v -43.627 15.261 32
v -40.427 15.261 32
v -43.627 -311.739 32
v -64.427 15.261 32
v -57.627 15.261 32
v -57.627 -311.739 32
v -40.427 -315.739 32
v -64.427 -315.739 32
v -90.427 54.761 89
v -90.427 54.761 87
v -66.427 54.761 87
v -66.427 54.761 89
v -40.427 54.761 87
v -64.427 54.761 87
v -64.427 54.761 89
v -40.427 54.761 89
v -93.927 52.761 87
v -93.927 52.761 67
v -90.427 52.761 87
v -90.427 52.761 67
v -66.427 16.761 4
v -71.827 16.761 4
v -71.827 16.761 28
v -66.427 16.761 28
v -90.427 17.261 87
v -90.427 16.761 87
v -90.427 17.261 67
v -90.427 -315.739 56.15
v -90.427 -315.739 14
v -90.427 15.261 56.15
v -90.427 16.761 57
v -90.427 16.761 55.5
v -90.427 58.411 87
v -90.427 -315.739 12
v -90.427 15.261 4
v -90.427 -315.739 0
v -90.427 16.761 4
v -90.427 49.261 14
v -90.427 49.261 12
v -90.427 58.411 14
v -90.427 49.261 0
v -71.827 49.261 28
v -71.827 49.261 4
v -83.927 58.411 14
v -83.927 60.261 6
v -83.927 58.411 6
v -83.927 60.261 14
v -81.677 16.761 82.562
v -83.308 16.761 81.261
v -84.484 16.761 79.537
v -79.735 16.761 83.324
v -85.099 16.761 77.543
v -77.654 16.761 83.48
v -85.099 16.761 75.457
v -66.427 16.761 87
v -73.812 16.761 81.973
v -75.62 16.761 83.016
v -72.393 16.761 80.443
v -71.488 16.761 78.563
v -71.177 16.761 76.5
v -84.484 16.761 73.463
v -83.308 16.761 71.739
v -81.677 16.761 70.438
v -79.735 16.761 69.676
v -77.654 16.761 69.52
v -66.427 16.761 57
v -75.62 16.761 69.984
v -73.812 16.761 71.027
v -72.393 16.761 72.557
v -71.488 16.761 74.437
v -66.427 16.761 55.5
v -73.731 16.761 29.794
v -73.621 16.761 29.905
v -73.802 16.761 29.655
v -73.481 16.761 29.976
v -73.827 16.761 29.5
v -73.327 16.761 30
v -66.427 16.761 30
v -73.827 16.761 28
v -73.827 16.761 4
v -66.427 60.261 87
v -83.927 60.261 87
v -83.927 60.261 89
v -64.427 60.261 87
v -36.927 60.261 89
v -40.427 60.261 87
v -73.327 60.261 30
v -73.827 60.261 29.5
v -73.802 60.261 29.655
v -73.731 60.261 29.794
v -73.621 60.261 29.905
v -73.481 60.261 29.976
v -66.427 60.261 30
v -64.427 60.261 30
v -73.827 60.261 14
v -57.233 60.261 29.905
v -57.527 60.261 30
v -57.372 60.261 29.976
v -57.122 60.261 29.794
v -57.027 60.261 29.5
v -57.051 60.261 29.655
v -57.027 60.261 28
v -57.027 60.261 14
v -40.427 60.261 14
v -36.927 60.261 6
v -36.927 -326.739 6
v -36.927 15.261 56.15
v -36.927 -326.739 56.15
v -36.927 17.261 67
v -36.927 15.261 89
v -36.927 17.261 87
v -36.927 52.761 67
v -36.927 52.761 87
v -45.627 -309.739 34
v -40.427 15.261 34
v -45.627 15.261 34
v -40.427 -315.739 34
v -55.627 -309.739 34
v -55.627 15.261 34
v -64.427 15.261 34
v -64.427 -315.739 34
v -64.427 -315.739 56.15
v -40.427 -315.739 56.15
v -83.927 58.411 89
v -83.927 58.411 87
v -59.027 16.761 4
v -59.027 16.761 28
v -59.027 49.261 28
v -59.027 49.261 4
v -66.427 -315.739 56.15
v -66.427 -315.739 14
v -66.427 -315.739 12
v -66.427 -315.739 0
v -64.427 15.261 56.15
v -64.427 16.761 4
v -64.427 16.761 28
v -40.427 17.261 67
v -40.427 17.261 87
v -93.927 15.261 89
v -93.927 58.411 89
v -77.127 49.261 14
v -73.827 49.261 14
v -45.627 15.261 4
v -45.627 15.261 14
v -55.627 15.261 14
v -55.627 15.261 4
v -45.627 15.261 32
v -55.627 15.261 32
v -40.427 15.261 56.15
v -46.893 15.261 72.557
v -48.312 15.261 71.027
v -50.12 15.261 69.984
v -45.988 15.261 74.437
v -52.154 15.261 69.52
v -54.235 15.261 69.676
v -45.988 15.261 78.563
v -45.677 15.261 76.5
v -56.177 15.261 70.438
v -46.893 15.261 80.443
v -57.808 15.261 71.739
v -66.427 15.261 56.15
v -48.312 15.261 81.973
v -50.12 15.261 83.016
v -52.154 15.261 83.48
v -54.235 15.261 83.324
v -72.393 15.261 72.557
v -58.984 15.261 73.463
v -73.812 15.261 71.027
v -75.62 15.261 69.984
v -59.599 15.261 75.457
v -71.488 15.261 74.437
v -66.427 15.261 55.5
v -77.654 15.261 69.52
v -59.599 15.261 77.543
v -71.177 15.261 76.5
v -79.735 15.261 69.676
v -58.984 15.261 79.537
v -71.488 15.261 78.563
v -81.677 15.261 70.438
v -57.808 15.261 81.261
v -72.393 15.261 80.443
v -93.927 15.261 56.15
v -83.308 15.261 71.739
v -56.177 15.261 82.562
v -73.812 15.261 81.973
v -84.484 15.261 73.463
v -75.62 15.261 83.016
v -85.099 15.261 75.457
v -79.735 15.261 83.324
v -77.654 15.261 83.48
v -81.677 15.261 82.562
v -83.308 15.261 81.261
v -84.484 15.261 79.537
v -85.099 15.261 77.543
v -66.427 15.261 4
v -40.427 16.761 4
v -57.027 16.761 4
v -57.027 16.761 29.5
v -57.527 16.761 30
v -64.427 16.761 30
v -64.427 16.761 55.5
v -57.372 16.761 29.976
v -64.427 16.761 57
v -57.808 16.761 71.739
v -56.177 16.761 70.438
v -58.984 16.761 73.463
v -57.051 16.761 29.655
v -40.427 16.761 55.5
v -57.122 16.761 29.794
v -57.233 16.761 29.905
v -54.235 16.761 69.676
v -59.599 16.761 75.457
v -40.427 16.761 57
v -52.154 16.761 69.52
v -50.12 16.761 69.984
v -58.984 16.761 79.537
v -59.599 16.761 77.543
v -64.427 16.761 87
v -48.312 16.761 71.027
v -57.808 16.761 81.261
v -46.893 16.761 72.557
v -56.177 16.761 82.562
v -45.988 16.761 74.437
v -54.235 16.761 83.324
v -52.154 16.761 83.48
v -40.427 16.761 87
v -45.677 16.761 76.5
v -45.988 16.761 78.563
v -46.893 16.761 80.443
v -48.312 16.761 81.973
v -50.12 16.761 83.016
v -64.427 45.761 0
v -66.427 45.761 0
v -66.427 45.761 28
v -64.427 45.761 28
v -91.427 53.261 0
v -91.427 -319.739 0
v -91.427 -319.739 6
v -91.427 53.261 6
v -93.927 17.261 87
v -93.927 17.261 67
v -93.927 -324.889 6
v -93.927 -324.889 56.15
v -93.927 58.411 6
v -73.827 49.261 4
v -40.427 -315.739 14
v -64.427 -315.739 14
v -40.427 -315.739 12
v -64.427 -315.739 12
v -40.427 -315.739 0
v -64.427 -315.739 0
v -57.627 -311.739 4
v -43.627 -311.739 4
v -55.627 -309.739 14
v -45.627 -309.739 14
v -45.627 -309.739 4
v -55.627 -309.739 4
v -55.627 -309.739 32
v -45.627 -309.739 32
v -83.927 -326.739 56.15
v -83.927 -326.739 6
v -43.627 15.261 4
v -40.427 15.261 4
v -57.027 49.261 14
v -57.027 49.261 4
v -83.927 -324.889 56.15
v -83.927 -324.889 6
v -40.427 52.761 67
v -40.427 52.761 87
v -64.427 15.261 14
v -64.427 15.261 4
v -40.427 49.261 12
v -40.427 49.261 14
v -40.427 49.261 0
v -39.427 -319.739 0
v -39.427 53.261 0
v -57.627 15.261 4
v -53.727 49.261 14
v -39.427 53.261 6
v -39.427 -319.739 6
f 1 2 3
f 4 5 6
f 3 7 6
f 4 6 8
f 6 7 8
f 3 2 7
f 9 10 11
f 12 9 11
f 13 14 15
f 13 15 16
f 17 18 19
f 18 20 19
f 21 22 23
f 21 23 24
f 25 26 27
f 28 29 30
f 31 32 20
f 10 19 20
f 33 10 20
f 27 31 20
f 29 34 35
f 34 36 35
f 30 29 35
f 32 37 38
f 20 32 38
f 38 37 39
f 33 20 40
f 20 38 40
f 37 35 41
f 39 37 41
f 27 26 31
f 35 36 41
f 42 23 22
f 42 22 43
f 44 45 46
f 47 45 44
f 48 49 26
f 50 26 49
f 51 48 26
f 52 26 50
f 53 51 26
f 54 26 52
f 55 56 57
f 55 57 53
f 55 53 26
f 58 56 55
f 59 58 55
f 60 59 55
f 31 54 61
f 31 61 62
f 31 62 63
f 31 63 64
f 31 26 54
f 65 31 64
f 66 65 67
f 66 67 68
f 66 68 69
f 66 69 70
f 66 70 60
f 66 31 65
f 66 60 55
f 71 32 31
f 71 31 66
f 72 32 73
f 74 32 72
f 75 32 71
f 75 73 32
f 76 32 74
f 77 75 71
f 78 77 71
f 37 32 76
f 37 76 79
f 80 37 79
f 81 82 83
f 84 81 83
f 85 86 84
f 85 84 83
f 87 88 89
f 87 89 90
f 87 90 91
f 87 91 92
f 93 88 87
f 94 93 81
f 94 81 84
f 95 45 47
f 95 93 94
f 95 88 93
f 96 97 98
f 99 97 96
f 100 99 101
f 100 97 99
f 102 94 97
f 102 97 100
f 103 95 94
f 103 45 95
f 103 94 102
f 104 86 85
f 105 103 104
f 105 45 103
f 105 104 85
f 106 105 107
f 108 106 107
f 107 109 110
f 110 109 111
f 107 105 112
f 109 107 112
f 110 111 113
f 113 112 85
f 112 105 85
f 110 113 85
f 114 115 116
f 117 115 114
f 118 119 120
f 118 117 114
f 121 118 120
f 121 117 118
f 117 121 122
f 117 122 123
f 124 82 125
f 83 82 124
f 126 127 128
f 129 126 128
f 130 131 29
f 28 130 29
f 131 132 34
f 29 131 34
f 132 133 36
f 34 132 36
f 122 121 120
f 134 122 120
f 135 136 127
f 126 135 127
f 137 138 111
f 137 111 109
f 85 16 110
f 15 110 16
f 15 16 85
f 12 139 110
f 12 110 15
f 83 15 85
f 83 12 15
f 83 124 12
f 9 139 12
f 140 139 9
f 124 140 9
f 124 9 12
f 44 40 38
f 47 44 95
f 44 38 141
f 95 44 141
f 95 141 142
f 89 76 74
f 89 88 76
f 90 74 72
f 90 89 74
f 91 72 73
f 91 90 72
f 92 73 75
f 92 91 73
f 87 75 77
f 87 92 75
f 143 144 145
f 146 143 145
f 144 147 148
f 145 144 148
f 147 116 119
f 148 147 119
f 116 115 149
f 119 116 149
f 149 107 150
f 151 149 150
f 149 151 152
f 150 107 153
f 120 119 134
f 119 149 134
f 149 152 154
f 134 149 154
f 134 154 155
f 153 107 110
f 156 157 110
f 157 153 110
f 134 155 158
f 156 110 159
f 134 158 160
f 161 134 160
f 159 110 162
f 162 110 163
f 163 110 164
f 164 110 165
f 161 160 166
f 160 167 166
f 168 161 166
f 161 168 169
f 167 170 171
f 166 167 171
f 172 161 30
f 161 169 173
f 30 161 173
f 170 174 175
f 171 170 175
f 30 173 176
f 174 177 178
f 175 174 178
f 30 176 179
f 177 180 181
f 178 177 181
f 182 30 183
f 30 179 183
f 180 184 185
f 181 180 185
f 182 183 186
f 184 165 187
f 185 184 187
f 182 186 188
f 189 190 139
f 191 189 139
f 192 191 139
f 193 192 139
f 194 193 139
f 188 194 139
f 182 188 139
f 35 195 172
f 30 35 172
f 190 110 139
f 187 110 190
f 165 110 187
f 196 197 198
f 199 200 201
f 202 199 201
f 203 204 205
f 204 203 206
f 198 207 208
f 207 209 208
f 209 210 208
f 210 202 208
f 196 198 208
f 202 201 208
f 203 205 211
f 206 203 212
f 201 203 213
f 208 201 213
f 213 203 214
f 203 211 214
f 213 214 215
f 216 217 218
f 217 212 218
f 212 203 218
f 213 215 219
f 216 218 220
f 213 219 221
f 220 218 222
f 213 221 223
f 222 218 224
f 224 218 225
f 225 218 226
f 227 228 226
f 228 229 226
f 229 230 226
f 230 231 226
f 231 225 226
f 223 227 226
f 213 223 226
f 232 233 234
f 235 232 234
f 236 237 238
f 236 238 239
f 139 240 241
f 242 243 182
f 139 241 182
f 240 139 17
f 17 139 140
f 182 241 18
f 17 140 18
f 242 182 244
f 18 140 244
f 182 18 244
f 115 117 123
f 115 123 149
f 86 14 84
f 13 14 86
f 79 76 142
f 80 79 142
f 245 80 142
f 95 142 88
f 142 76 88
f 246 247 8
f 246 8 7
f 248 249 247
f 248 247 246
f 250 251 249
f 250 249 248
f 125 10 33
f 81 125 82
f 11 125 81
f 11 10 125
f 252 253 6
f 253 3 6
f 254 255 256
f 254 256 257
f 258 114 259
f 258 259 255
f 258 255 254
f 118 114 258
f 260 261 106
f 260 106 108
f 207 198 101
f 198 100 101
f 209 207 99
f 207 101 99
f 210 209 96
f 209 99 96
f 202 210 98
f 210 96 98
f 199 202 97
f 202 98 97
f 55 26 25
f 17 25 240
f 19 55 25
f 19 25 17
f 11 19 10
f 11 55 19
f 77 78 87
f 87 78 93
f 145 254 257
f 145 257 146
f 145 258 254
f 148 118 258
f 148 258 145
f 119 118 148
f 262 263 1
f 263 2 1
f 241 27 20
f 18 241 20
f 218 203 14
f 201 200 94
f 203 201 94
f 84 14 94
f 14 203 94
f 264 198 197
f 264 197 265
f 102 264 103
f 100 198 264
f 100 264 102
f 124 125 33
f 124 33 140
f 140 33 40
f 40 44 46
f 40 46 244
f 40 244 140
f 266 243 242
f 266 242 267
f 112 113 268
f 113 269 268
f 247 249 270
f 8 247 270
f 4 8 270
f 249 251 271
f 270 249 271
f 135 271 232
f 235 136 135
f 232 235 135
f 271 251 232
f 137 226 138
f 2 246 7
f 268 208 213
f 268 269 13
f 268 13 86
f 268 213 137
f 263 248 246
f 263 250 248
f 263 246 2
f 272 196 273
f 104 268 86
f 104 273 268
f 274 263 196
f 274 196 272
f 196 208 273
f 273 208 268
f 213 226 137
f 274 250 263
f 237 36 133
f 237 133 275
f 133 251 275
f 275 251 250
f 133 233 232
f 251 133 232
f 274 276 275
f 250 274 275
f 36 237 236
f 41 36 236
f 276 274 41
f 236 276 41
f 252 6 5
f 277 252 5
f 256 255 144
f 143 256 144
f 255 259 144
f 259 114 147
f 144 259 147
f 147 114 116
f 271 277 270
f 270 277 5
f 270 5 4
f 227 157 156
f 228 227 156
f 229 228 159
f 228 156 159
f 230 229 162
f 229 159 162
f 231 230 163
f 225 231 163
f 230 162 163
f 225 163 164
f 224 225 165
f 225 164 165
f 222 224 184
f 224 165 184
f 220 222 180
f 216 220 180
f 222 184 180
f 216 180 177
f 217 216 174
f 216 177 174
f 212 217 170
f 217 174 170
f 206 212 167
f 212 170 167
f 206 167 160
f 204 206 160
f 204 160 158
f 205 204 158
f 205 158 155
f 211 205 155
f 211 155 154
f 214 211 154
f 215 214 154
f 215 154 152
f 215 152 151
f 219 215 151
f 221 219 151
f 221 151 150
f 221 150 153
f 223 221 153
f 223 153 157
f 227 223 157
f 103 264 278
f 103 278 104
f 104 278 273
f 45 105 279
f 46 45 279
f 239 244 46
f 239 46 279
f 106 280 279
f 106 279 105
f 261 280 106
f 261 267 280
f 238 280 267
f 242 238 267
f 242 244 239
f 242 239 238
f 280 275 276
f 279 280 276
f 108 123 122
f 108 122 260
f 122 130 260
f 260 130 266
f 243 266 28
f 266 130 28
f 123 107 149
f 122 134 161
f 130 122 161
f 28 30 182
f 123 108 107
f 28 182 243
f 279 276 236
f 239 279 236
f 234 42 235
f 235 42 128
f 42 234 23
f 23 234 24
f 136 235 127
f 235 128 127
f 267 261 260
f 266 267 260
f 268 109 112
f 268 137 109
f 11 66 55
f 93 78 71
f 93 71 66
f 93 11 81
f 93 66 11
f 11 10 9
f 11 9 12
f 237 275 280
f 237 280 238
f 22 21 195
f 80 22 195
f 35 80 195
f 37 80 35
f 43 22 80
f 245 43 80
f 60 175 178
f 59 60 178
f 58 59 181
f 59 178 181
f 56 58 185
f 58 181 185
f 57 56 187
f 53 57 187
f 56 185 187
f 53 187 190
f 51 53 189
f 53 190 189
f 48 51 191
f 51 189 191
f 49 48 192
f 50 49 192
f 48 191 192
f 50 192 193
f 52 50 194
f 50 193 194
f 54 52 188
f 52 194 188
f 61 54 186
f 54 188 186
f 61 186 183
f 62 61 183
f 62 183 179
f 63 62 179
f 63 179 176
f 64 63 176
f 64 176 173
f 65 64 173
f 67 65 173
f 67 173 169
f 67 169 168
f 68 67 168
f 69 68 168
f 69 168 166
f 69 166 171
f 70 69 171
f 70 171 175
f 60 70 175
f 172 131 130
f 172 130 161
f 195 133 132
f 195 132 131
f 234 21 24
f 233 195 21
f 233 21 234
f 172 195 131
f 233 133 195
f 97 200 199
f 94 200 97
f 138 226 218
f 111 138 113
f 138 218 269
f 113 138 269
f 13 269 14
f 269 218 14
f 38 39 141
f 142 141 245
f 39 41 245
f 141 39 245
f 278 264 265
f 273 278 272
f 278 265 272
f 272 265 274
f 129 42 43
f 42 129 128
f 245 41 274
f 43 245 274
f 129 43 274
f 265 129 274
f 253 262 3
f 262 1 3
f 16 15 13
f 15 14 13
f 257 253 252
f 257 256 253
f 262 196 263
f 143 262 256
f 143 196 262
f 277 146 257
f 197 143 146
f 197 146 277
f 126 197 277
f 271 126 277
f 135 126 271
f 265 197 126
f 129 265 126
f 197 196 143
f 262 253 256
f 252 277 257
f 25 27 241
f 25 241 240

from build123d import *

# Parameters (mm, degrees)
SZKIC1_W                     = 53
SZKIC1_H                     = 374
SZKIC1_W_2                   = 24
SZKIC1_H_2                   = 365
DODANIE_WYCI_GNI_CIE2_DEPTH  = 12
SZKIC2_W                     = 12
SZKIC2_H                     = 3.5
WYTNIJ_WYCI_GNI_CIE1_DEPTH   = 2
SZKIC3_W                     = 53
SZKIC3_H                     = 374
DODANIE_WYCI_GNI_CIE3_DEPTH  = 2
SZKIC4_W                     = 13.3
SZKIC4_H                     = 30.500081729
SZKIC4_W_2                   = 9.4
SZKIC4_H_2                   = 64.96
WYTNIJ_WYCI_GNI_CIE2_DEPTH   = 2
SZKIC5_W                     = 2
SZKIC5_H                     = 374
DODANIE_WYCI_GNI_CIE4_DEPTH  = 43
DODANIE_WYCI_GNI_CIE5_DEPTH  = 41.5
SZKIC7_W                     = 25.5
SZKIC7_H                     = 38.500081729
DODANIE_WYCI_GNI_CIE6_DEPTH  = 1.5
DODANIE_WYCI_GNI_CIE7_DEPTH  = 43
DODANIE_WYCI_GNI_CIE8_DEPTH  = 43
SZKIC15_W                    = 57
SZKIC15_H                    = 374
DODANIE_WYCI_GNI_CIE10_DEPTH = 1
SZKIC16_W                    = 57
SZKIC16_H                    = 374
DODANIE_WYCI_GNI_CIE11_DEPTH = 1
SZKIC17_W                    = 55
SZKIC17_H                    = 57
SZKIC17_W_2                  = 24
SZKIC17_H_2                  = 41.5
DODANIE_WYCI_GNI_CIE12_DEPTH = 1
SZKIC18_W                    = 55
SZKIC18_H                    = 57
DODANIE_WYCI_GNI_CIE13_DEPTH = 1
SZKIC19_W                    = 55
SZKIC19_H                    = 376
SZKIC19_W_2                  = 52
SZKIC19_H_2                  = 373
WYTNIJ_WYCI_GNI_CIE7_DEPTH   = 6
SZKIC23_W                    = 24
SZKIC23_H                    = 38.000081729
WYTNIJ_WYCI_GNI_CIE11_DEPTH  = 10
DODANIE_WYCI_GNI_CIE14_DEPTH = 32
SZKIC25_W                    = 24
SZKIC25_H                    = 2
DODANIE_WYCI_GNI_CIE15_DEPTH = 38
SZKIC26_W                    = 24
SZKIC26_H                    = 2
DODANIE_WYCI_GNI_CIE16_DEPTH = 38
SZKIC27_R                    = 7
WYTNIJ_WYCI_GNI_CIE12_DEPTH  = 10
SZKIC28_W                    = 20
SZKIC28_H                    = 35.5
WYTNIJ_WYCI_GNI_CIE13_DEPTH  = 3
SZKIC29_W                    = 20
SZKIC29_H                    = 35.5
WYTNIJ_WYCI_GNI_CIE14_DEPTH  = 3
SZKIC33_W                    = 55
SZKIC33_H                    = 83
SZKIC33_W_2                  = 24
SZKIC33_H_2                  = 73
DODANIE_WYCI_GNI_CIE17_DEPTH = 5.5
SZKIC34_W                    = 55
SZKIC34_H                    = 51
DODANIE_WYCI_GNI_CIE18_DEPTH = 5.5
SZKIC35_W                    = 20
SZKIC35_H                    = 35.5
DODANIE_WYCI_GNI_CIE19_DEPTH = 1
SZKIC36_W                    = 20
SZKIC36_H                    = 35.5
DODANIE_WYCI_GNI_CIE20_DEPTH = 1
SZKIC37_W                    = 24
SZKIC37_H                    = 330.999918271
WYTNIJ_WYCI_GNI_CIE15_DEPTH  = 2
SZKIC38_W                    = 24
SZKIC38_H                    = 330.999918271
WYTNIJ_WYCI_GNI_CIE16_DEPTH  = 2
WYTNIJ_WYCI_GNI_CIE17_DEPTH  = 2
SZKIC40_W                    = 2
SZKIC40_H                    = 3.5
WYTNIJ_WYCI_GNI_CIE18_DEPTH  = 14
DODANIE_WYCI_GNI_CIE21_DEPTH = 331
SZKIC42_W                    = 10
SZKIC42_H                    = 324.999918271
WYTNIJ_WYCI_GNI_CIE19_DEPTH  = 2
DODANIE_WYCI_GNI_CIE22_DEPTH = 18
SZKIC44_W                    = 10
SZKIC44_H                    = 324.999918271
DODANIE_WYCI_GNI_CIE23_DEPTH = 10
SZKIC45_W                    = 2
SZKIC45_H                    = 43.500081729
DODANIE_WYCI_GNI_CIE24_DEPTH = 7.4
SZKIC46_W                    = 7.4
SZKIC46_H                    = 11
DODANIE_WYCI_GNI_CIE25_DEPTH = 14
SZKIC47_W                    = 2
SZKIC47_H                    = 32.500081729
DODANIE_WYCI_GNI_CIE26_DEPTH = 24
WYTNIJ_WYCI_GNI_CIE20_DEPTH  = 1.85
SZKIC49_W                    = 10
SZKIC49_H                    = 51
WYTNIJ_WYCI_GNI_CIE21_DEPTH  = 1.85
WYTNIJ_WYCI_GNI_CIE22_DEPTH  = 0.85
DODANIE_WYCI_GNI_CIE27_DEPTH = 7.4
SZKIC52_W                    = 7.4
SZKIC52_H                    = 11
DODANIE_WYCI_GNI_CIE28_DEPTH = 14
SZKIC53_W                    = 2
SZKIC53_H                    = 32.500081729
DODANIE_WYCI_GNI_CIE30_DEPTH = 24
SZKIC54_W                    = 24
SZKIC54_H                    = 1.5
DODANIE_WYCI_GNI_CIE31_DEPTH = 10
ZAOKR_GLENIE1_R              = 0.5
ZAOKR_GLENIE2_R              = 0.5


with BuildPart() as part:
    # Szkic1 → Dodanie-wyciągnięcie2 (new body)
    with BuildSketch(Plane.XY):
        with Locations((-65.426891924, -133.239080048)):
            Rectangle(SZKIC1_W, SZKIC1_H)
        with Locations((-78.426891924, -133.239080048)):
            Rectangle(SZKIC1_W_2, SZKIC1_H_2, mode=Mode.SUBTRACT)
        with Locations((-52.426891924, -133.239080048)):
            Rectangle(SZKIC1_W_2, SZKIC1_H_2, mode=Mode.SUBTRACT)
    extrude(amount=DODANIE_WYCI_GNI_CIE2_DEPTH)

    # Szkic2 → Wytnij-wyciągnięcie1 (cut)
    with BuildSketch(Plane.ZY.offset(66.426891924)):
        with Locations((6, 47.510919952)):
            Rectangle(SZKIC2_W, SZKIC2_H)
    extrude(amount=-WYTNIJ_WYCI_GNI_CIE1_DEPTH, mode=Mode.SUBTRACT)

    # Szkic3 → Dodanie-wyciągnięcie3 (add)
    with BuildSketch(Plane.XY.offset(12)):
        with Locations((-65.426891924, -133.239080048)):
            Rectangle(SZKIC3_W, SZKIC3_H)
    extrude(amount=DODANIE_WYCI_GNI_CIE3_DEPTH)

    # Szkic4 → Wytnij-wyciągnięcie2 (cut)
    with BuildSketch(Plane.XY.offset(14)):
        Polygon((-46.926891924, -11.039080048), (-56.326891924, -11.039080048), (-56.326891924, -35.399080048), (-56.326891924, -40.479080048), (-46.926891924, -40.479080048), (-46.926891924, -35.399080048), align=None)
        with Locations((-47.076891924, 34.010879088)):
            Rectangle(SZKIC4_W, SZKIC4_H)
        with Locations((-83.776891924, 34.010879088)):
            Rectangle(SZKIC4_W, SZKIC4_H)
        Polygon((-74.526891924, -35.399080048), (-74.526891924, -40.479080048), (-83.926891924, -40.479080048), (-83.926891924, -35.399080048), (-83.926891924, -11.039080048), (-74.526891924, -11.039080048), align=None)
        with Locations((-51.626891924, -133.719080048)):
            Rectangle(SZKIC4_W_2, SZKIC4_H_2)
        with Locations((-79.226891924, -133.719080048)):
            Rectangle(SZKIC4_W_2, SZKIC4_H_2)
    extrude(amount=-WYTNIJ_WYCI_GNI_CIE2_DEPTH, mode=Mode.SUBTRACT)

    # Szkic5 → Dodanie-wyciągnięcie4 (add)
    with BuildSketch(Plane.XY.offset(14)):
        with Locations((-65.426891924, -133.239080048)):
            Rectangle(SZKIC5_W, SZKIC5_H)
    extrude(amount=DODANIE_WYCI_GNI_CIE4_DEPTH)

    # Szkic6 → Dodanie-wyciągnięcie5 (add)
    with BuildSketch(Plane.XY.offset(14)):
        Polygon((-64.426891924, 16.760838223), (-40.426891924, 16.760838223), (-40.426891924, 53.760919952), (-38.926891924, 53.760919952), (-38.926891924, 15.260838223), (-64.426891924, 15.260838223), align=None)
        Polygon((-90.426891924, 53.760919952), (-91.926891924, 53.760919952), (-91.926891924, 15.260838223), (-66.426891924, 15.260838223), (-66.426891924, 16.760838223), (-90.426891924, 16.760838223), align=None)
    extrude(amount=DODANIE_WYCI_GNI_CIE5_DEPTH)

    # Szkic7 → Dodanie-wyciągnięcie6 (add)
    with BuildSketch(Plane.XY.offset(55.5)):
        with Locations((-51.676891924, 34.510879088)):
            Rectangle(SZKIC7_W, SZKIC7_H)
        with Locations((-79.176891924, 34.510879088)):
            Rectangle(SZKIC7_W, SZKIC7_H)
    extrude(amount=DODANIE_WYCI_GNI_CIE6_DEPTH)

    # Szkic10 → Dodanie-wyciągnięcie7 (add)
    with BuildSketch(Plane.XY.offset(14)):
        Polygon((-91.926891924, 15.260838223), (-91.926891924, -320.239080048), (-66.426891924, -320.239080048), (-66.426891924, -315.739080048), (-90.426891924, -315.739080048), (-90.426891924, 15.260838223), align=None)
    extrude(amount=DODANIE_WYCI_GNI_CIE7_DEPTH)

    # Szkic11 → Dodanie-wyciągnięcie8 (add)
    with BuildSketch(Plane.XY.offset(14)):
        Polygon((-38.926891924, 15.260838223), (-38.926891924, -320.239080048), (-64.426891924, -320.239080048), (-64.426891924, -315.739080048), (-40.426891924, -315.739080048), (-40.426891924, 15.260838223), align=None)
    extrude(amount=DODANIE_WYCI_GNI_CIE8_DEPTH)

    # Szkic15 → Dodanie-wyciągnięcie10 (add)
    with BuildSketch(Plane.ZY.offset(91.926891924)):
        with Locations((28.5, -133.239080048)):
            Rectangle(SZKIC15_W, SZKIC15_H)
    extrude(amount=DODANIE_WYCI_GNI_CIE10_DEPTH)

    # Szkic16 → Dodanie-wyciągnięcie11 (add)
    with BuildSketch(Plane(origin=(-38.926891924, 0, 0), x_dir=(0, 0, -1), z_dir=(1, 0, 0))):
        with Locations((-28.5, -133.239080048)):
            Rectangle(SZKIC16_W, SZKIC16_H)
    extrude(amount=DODANIE_WYCI_GNI_CIE11_DEPTH)

    # Szkic17 → Dodanie-wyciągnięcie12 (add)
    with BuildSketch(Plane(origin=(0, 53.760919952, 0), x_dir=(1, 0, 0), z_dir=(0, 1, 0))):
        with Locations((-65.426891924, -28.5)):
            Rectangle(SZKIC17_W, SZKIC17_H)
        with Locations((-52.426891924, -34.75)):
            Rectangle(SZKIC17_W_2, SZKIC17_H_2, mode=Mode.SUBTRACT)
        with Locations((-78.426891924, -34.75)):
            Rectangle(SZKIC17_W_2, SZKIC17_H_2, mode=Mode.SUBTRACT)
    extrude(amount=DODANIE_WYCI_GNI_CIE12_DEPTH)

    # Szkic18 → Dodanie-wyciągnięcie13 (add)
    with BuildSketch(Plane.XZ.offset(320.239080048)):
        with Locations((-65.426891924, 28.5)):
            Rectangle(SZKIC18_W, SZKIC18_H)
    extrude(amount=DODANIE_WYCI_GNI_CIE13_DEPTH)

    # Szkic19 → Wytnij-wyciągnięcie7 (cut)
    with BuildSketch(Plane(origin=(0, 0, 0), x_dir=(-1, 0, 0), z_dir=(0, 0, -1))):
        with Locations((65.426891924, -133.239080048)):
            Rectangle(SZKIC19_W, SZKIC19_H)
        with Locations((65.426891924, -133.239080048)):
            Rectangle(SZKIC19_W_2, SZKIC19_H_2, mode=Mode.SUBTRACT)
    extrude(amount=-WYTNIJ_WYCI_GNI_CIE7_DEPTH, mode=Mode.SUBTRACT)

    # Szkic23 → Wytnij-wyciągnięcie11 (cut)
    with BuildSketch(Plane.XY.offset(57)):
        with Locations((-52.426891924, 35.760879088)):
            Rectangle(SZKIC23_W, SZKIC23_H)
        with Locations((-78.426891924, 35.760879088)):
            Rectangle(SZKIC23_W, SZKIC23_H)
    extrude(amount=-WYTNIJ_WYCI_GNI_CIE11_DEPTH, mode=Mode.SUBTRACT)

    # Szkic24 → Dodanie-wyciągnięcie14 (add)
    with BuildSketch(Plane.XY.offset(57)):
        Polygon((-40.426891924, 54.760919952), (-37.926891924, 54.760919952), (-37.926891924, 15.260838223), (-92.926891924, 15.260838223), (-92.926891924, 54.760919952), (-90.426891924, 54.760919952), (-90.426891924, 16.760838223), (-66.426891924, 16.760838223), (-66.426891924, 54.760919952), (-64.426891924, 54.760919952), (-64.426891924, 16.760838223), (-40.426891924, 16.760838223), align=None)
    extrude(amount=DODANIE_WYCI_GNI_CIE14_DEPTH)

    # Szkic25 → Dodanie-wyciągnięcie15 (add)
    with BuildSketch(Plane(origin=(0, 16.760838223, 0), x_dir=(1, 0, 0), z_dir=(0, 1, 0))):
        with Locations((-52.426891924, -88)):
            Rectangle(SZKIC25_W, SZKIC25_H)
    extrude(amount=DODANIE_WYCI_GNI_CIE15_DEPTH)

    # Szkic26 → Dodanie-wyciągnięcie16 (add)
    with BuildSketch(Plane(origin=(0, 16.760838223, 0), x_dir=(1, 0, 0), z_dir=(0, 1, 0))):
        with Locations((-78.426891924, -88)):
            Rectangle(SZKIC26_W, SZKIC26_H)
    extrude(amount=DODANIE_WYCI_GNI_CIE16_DEPTH)

    # Szkic27 → Wytnij-wyciągnięcie12 (cut)
    with BuildSketch(Plane.XZ.offset(-15.260838223)):
        with Locations((-78.176891924, 76.5)):
            Circle(SZKIC27_R)
        with Locations((-52.676891924, 76.5)):
            Circle(SZKIC27_R)
    extrude(amount=-WYTNIJ_WYCI_GNI_CIE12_DEPTH, mode=Mode.SUBTRACT)

    # Szkic28 → Wytnij-wyciągnięcie13 (cut)
    with BuildSketch(Plane(origin=(-37.926891924, 0, 0), x_dir=(0, 0, -1), z_dir=(1, 0, 0))):
        with Locations((-77, 35.010838223)):
            Rectangle(SZKIC28_W, SZKIC28_H)
    extrude(amount=-WYTNIJ_WYCI_GNI_CIE13_DEPTH, mode=Mode.SUBTRACT)

    # Szkic29 → Wytnij-wyciągnięcie14 (cut)
    with BuildSketch(Plane.ZY.offset(92.926891924)):
        with Locations((77, 35.010838223)):
            Rectangle(SZKIC29_W, SZKIC29_H)
    extrude(amount=-WYTNIJ_WYCI_GNI_CIE14_DEPTH, mode=Mode.SUBTRACT)

    # Szkic33 → Dodanie-wyciągnięcie17 (add)
    with BuildSketch(Plane(origin=(0, 54.760919952, 0), x_dir=(1, 0, 0), z_dir=(0, 1, 0))):
        with Locations((-65.426891924, -47.5)):
            Rectangle(SZKIC33_W, SZKIC33_H)
        with Locations((-52.426891924, -50.5)):
            Rectangle(SZKIC33_W_2, SZKIC33_H_2, mode=Mode.SUBTRACT)
        with Locations((-78.426891924, -50.5)):
            Rectangle(SZKIC33_W_2, SZKIC33_H_2, mode=Mode.SUBTRACT)
    extrude(amount=DODANIE_WYCI_GNI_CIE17_DEPTH)

    # Szkic34 → Dodanie-wyciągnięcie18 (add)
    with BuildSketch(Plane.XZ.offset(321.239080048)):
        with Locations((-65.426891924, 31.5)):
            Rectangle(SZKIC34_W, SZKIC34_H)
    extrude(amount=DODANIE_WYCI_GNI_CIE18_DEPTH)

    # Szkic35 → Dodanie-wyciągnięcie19 (add)
    with BuildSketch(Plane.ZY.offset(92.926891924)):
        Polygon((89, 60.260919952), (89, 15.260838223), (57, 15.260838223), (57, -326.739080048), (6, -326.739080048), (6, 60.260919952), align=None)
        with Locations((77, 35.010838223)):
            Rectangle(SZKIC35_W, SZKIC35_H, mode=Mode.SUBTRACT)
    extrude(amount=DODANIE_WYCI_GNI_CIE19_DEPTH)

    # Szkic36 → Dodanie-wyciągnięcie20 (add)
    with BuildSketch(Plane(origin=(-37.926891924, 0, 0), x_dir=(0, 0, -1), z_dir=(1, 0, 0))):
        Polygon((-57, -326.739080048), (-57, 15.260838223), (-89, 15.260838223), (-89, 60.260919952), (-6, 60.260919952), (-6, -326.739080048), align=None)
        with Locations((-77, 35.010838223)):
            Rectangle(SZKIC36_W, SZKIC36_H, mode=Mode.SUBTRACT)
    extrude(amount=DODANIE_WYCI_GNI_CIE20_DEPTH)

    # Szkic37 → Wytnij-wyciągnięcie15 (cut)
    with BuildSketch(Plane.XY.offset(14)):
        with Locations((-52.426891924, -150.239120912)):
            Rectangle(SZKIC37_W, SZKIC37_H)
    extrude(amount=-WYTNIJ_WYCI_GNI_CIE15_DEPTH, mode=Mode.SUBTRACT)

    # Szkic38 → Wytnij-wyciągnięcie16 (cut)
    with BuildSketch(Plane.XY.offset(14)):
        with Locations((-78.426891924, -150.239120912)):
            Rectangle(SZKIC38_W, SZKIC38_H)
    extrude(amount=-WYTNIJ_WYCI_GNI_CIE16_DEPTH, mode=Mode.SUBTRACT)

    # Szkic39 → Wytnij-wyciągnięcie17 (cut)
    with BuildSketch(Plane(origin=(0, 0, 12), x_dir=(-1, 0, 0), z_dir=(0, 0, -1))):
        Polygon((90.426891924, 15.260838223), (66.426891924, 15.260838223), (66.426891924, 45.760919952), (64.426891924, 45.760919952), (64.426891924, 15.260838223), (40.426891924, 15.260838223), (40.426891924, 49.260919952), (90.426891924, 49.260919952), align=None)
    extrude(amount=-WYTNIJ_WYCI_GNI_CIE17_DEPTH, mode=Mode.SUBTRACT)

    # Szkic40 → Wytnij-wyciągnięcie18 (cut)
    with BuildSketch(Plane(origin=(0, 0, 14), x_dir=(-1, 0, 0), z_dir=(0, 0, -1))):
        with Locations((65.426891924, 47.510919952)):
            Rectangle(SZKIC40_W, SZKIC40_H)
    extrude(amount=-WYTNIJ_WYCI_GNI_CIE18_DEPTH, mode=Mode.SUBTRACT)

    # Szkic41 → Dodanie-wyciągnięcie21 (add)
    with BuildSketch(Plane(origin=(0, -315.739080048, 0), x_dir=(1, 0, 0), z_dir=(0, 1, 0))):
        Polygon((-52.426891924, -32), (-40.426891924, -32), (-40.426891924, -34), (-64.426891924, -34), (-64.426891924, -32), align=None)
    extrude(amount=DODANIE_WYCI_GNI_CIE21_DEPTH)

    # Szkic42 → Wytnij-wyciągnięcie19 (cut)
    with BuildSketch(Plane.XY.offset(34)):
        with Locations((-50.626891924, -147.239120912)):
            Rectangle(SZKIC42_W, SZKIC42_H)
    extrude(amount=-WYTNIJ_WYCI_GNI_CIE19_DEPTH, mode=Mode.SUBTRACT)

    # Szkic43 → Dodanie-wyciągnięcie22 (add)
    with BuildSketch(Plane(origin=(0, 0, 32), x_dir=(-1, 0, 0), z_dir=(0, 0, -1))):
        Polygon((45.626891924, 15.260838223), (45.626891924, -309.739080048), (55.626891924, -309.739080048), (55.626891924, 15.260838223), (57.626891924, 15.260838223), (57.626891924, -311.739161777), (43.626891924, -311.739161777), (43.626891924, 15.260838223), align=None)
    extrude(amount=DODANIE_WYCI_GNI_CIE22_DEPTH)

    # Szkic44 → Dodanie-wyciągnięcie23 (add)
    with BuildSketch(Plane(origin=(0, 0, 14), x_dir=(-1, 0, 0), z_dir=(0, 0, -1))):
        Polygon((64.426891924, 16.760838223), (40.426891924, 16.760838223), (40.426891924, 15.260838223), (43.626891924, 15.260838223), (43.626891924, -311.739161777), (57.626891924, -311.739161777), (57.626891924, 15.260838223), (64.426891924, 15.260838223), align=None)
        with Locations((50.626891924, -147.239120912)):
            Rectangle(SZKIC44_W, SZKIC44_H, mode=Mode.SUBTRACT)
    extrude(amount=DODANIE_WYCI_GNI_CIE23_DEPTH)

    # Szkic45 → Dodanie-wyciągnięcie24 (add)
    with BuildSketch(Plane(origin=(-64.426891924, 0, 0), x_dir=(0, 0, -1), z_dir=(1, 0, 0))):
        with Locations((-29, 38.510879088)):
            Rectangle(SZKIC45_W, SZKIC45_H)
    extrude(amount=DODANIE_WYCI_GNI_CIE24_DEPTH)

    # Szkic46 → Dodanie-wyciągnięcie25 (add)
    with BuildSketch(Plane.XY.offset(14)):
        with Locations((-60.726891924, 54.760919952)):
            Rectangle(SZKIC46_W, SZKIC46_H)
    extrude(amount=DODANIE_WYCI_GNI_CIE25_DEPTH)

    # Szkic47 → Dodanie-wyciągnięcie26 (add)
    with BuildSketch(Plane(origin=(0, 0, 28), x_dir=(-1, 0, 0), z_dir=(0, 0, -1))):
        with Locations((58.026891924, 33.010879088)):
            Rectangle(SZKIC47_W, SZKIC47_H)
    extrude(amount=DODANIE_WYCI_GNI_CIE26_DEPTH)

    # Szkic48 → Wytnij-wyciągnięcie20 (cut)
    with BuildSketch(Plane(origin=(0, 60.260919952, 0), x_dir=(1, 0, 0), z_dir=(0, 1, 0))):
        Polygon((-93.926891924, -6), (-83.926891924, -6), (-83.926891924, -14), (-90.426891924, -14), (-90.426891924, -87), (-83.926891924, -87), (-83.926891924, -89), (-93.926891924, -89), align=None)
    extrude(amount=-WYTNIJ_WYCI_GNI_CIE20_DEPTH, mode=Mode.SUBTRACT)

    # Szkic49 → Wytnij-wyciągnięcie21 (cut)
    with BuildSketch(Plane.XZ.offset(326.739080048)):
        with Locations((-88.926891924, 31.5)):
            Rectangle(SZKIC49_W, SZKIC49_H)
    extrude(amount=-WYTNIJ_WYCI_GNI_CIE21_DEPTH, mode=Mode.SUBTRACT)

    # Szkic50 → Wytnij-wyciągnięcie22 (cut)
    with BuildSketch(Plane.XY.offset(57)):
        Polygon((-40.426891924, 15.260838223), (-36.926891924, 15.260838223), (-36.926891924, -326.739080048), (-83.926891924, -326.739080048), (-83.926891924, -324.889080048), (-93.926891924, -324.889080048), (-93.926891924, 15.260838223), (-90.426891924, 15.260838223), (-90.426891924, -315.739080048), (-66.426891924, -315.739080048), (-66.426891924, 15.260838223), (-64.426891924, 15.260838223), (-64.426891924, -315.739080048), (-40.426891924, -315.739080048), align=None)
    extrude(amount=-WYTNIJ_WYCI_GNI_CIE22_DEPTH, mode=Mode.SUBTRACT)

    # Szkic51 → Dodanie-wyciągnięcie27 (add)
    with BuildSketch(Plane.ZY.offset(66.426891924)):
        Polygon((28, 45.760919952), (28, 16.760838223), (30, 16.760838223), (30, 60.260919952), (28, 60.260919952), align=None)
    extrude(amount=DODANIE_WYCI_GNI_CIE27_DEPTH)

    # Szkic52 → Dodanie-wyciągnięcie28 (add)
    with BuildSketch(Plane.XY.offset(14)):
        with Locations((-70.126891924, 54.760919952)):
            Rectangle(SZKIC52_W, SZKIC52_H)
    extrude(amount=DODANIE_WYCI_GNI_CIE28_DEPTH)

    # Szkic53 → Dodanie-wyciągnięcie30 (add)
    with BuildSketch(Plane(origin=(0, 0, 28), x_dir=(-1, 0, 0), z_dir=(0, 0, -1))):
        with Locations((72.826891924, 33.010879088)):
            Rectangle(SZKIC53_W, SZKIC53_H)
    extrude(amount=DODANIE_WYCI_GNI_CIE30_DEPTH)

    # Szkic54 → Dodanie-wyciągnięcie31 (add)
    with BuildSketch(Plane(origin=(0, 0, 14), x_dir=(-1, 0, 0), z_dir=(0, 0, -1))):
        with Locations((78.426891924, 16.010838223)):
            Rectangle(SZKIC54_W, SZKIC54_H)
    extrude(amount=DODANIE_WYCI_GNI_CIE31_DEPTH)

    # Zaokrąglenie1
    zaokr_glenie1_edges = [part.edges().sort_by_distance(p)[0] for p in [
        (-73.826891924, 38.510879088, 30),
    ]]
    fillet(zaokr_glenie1_edges, radius=ZAOKR_GLENIE1_R)

    # Zaokrąglenie2
    zaokr_glenie2_edges = [part.edges().sort_by_distance(p)[0] for p in [
        (-57.026891924, 38.510879088, 30),
    ]]
    fillet(zaokr_glenie2_edges, radius=ZAOKR_GLENIE2_R)


solid = part.part
